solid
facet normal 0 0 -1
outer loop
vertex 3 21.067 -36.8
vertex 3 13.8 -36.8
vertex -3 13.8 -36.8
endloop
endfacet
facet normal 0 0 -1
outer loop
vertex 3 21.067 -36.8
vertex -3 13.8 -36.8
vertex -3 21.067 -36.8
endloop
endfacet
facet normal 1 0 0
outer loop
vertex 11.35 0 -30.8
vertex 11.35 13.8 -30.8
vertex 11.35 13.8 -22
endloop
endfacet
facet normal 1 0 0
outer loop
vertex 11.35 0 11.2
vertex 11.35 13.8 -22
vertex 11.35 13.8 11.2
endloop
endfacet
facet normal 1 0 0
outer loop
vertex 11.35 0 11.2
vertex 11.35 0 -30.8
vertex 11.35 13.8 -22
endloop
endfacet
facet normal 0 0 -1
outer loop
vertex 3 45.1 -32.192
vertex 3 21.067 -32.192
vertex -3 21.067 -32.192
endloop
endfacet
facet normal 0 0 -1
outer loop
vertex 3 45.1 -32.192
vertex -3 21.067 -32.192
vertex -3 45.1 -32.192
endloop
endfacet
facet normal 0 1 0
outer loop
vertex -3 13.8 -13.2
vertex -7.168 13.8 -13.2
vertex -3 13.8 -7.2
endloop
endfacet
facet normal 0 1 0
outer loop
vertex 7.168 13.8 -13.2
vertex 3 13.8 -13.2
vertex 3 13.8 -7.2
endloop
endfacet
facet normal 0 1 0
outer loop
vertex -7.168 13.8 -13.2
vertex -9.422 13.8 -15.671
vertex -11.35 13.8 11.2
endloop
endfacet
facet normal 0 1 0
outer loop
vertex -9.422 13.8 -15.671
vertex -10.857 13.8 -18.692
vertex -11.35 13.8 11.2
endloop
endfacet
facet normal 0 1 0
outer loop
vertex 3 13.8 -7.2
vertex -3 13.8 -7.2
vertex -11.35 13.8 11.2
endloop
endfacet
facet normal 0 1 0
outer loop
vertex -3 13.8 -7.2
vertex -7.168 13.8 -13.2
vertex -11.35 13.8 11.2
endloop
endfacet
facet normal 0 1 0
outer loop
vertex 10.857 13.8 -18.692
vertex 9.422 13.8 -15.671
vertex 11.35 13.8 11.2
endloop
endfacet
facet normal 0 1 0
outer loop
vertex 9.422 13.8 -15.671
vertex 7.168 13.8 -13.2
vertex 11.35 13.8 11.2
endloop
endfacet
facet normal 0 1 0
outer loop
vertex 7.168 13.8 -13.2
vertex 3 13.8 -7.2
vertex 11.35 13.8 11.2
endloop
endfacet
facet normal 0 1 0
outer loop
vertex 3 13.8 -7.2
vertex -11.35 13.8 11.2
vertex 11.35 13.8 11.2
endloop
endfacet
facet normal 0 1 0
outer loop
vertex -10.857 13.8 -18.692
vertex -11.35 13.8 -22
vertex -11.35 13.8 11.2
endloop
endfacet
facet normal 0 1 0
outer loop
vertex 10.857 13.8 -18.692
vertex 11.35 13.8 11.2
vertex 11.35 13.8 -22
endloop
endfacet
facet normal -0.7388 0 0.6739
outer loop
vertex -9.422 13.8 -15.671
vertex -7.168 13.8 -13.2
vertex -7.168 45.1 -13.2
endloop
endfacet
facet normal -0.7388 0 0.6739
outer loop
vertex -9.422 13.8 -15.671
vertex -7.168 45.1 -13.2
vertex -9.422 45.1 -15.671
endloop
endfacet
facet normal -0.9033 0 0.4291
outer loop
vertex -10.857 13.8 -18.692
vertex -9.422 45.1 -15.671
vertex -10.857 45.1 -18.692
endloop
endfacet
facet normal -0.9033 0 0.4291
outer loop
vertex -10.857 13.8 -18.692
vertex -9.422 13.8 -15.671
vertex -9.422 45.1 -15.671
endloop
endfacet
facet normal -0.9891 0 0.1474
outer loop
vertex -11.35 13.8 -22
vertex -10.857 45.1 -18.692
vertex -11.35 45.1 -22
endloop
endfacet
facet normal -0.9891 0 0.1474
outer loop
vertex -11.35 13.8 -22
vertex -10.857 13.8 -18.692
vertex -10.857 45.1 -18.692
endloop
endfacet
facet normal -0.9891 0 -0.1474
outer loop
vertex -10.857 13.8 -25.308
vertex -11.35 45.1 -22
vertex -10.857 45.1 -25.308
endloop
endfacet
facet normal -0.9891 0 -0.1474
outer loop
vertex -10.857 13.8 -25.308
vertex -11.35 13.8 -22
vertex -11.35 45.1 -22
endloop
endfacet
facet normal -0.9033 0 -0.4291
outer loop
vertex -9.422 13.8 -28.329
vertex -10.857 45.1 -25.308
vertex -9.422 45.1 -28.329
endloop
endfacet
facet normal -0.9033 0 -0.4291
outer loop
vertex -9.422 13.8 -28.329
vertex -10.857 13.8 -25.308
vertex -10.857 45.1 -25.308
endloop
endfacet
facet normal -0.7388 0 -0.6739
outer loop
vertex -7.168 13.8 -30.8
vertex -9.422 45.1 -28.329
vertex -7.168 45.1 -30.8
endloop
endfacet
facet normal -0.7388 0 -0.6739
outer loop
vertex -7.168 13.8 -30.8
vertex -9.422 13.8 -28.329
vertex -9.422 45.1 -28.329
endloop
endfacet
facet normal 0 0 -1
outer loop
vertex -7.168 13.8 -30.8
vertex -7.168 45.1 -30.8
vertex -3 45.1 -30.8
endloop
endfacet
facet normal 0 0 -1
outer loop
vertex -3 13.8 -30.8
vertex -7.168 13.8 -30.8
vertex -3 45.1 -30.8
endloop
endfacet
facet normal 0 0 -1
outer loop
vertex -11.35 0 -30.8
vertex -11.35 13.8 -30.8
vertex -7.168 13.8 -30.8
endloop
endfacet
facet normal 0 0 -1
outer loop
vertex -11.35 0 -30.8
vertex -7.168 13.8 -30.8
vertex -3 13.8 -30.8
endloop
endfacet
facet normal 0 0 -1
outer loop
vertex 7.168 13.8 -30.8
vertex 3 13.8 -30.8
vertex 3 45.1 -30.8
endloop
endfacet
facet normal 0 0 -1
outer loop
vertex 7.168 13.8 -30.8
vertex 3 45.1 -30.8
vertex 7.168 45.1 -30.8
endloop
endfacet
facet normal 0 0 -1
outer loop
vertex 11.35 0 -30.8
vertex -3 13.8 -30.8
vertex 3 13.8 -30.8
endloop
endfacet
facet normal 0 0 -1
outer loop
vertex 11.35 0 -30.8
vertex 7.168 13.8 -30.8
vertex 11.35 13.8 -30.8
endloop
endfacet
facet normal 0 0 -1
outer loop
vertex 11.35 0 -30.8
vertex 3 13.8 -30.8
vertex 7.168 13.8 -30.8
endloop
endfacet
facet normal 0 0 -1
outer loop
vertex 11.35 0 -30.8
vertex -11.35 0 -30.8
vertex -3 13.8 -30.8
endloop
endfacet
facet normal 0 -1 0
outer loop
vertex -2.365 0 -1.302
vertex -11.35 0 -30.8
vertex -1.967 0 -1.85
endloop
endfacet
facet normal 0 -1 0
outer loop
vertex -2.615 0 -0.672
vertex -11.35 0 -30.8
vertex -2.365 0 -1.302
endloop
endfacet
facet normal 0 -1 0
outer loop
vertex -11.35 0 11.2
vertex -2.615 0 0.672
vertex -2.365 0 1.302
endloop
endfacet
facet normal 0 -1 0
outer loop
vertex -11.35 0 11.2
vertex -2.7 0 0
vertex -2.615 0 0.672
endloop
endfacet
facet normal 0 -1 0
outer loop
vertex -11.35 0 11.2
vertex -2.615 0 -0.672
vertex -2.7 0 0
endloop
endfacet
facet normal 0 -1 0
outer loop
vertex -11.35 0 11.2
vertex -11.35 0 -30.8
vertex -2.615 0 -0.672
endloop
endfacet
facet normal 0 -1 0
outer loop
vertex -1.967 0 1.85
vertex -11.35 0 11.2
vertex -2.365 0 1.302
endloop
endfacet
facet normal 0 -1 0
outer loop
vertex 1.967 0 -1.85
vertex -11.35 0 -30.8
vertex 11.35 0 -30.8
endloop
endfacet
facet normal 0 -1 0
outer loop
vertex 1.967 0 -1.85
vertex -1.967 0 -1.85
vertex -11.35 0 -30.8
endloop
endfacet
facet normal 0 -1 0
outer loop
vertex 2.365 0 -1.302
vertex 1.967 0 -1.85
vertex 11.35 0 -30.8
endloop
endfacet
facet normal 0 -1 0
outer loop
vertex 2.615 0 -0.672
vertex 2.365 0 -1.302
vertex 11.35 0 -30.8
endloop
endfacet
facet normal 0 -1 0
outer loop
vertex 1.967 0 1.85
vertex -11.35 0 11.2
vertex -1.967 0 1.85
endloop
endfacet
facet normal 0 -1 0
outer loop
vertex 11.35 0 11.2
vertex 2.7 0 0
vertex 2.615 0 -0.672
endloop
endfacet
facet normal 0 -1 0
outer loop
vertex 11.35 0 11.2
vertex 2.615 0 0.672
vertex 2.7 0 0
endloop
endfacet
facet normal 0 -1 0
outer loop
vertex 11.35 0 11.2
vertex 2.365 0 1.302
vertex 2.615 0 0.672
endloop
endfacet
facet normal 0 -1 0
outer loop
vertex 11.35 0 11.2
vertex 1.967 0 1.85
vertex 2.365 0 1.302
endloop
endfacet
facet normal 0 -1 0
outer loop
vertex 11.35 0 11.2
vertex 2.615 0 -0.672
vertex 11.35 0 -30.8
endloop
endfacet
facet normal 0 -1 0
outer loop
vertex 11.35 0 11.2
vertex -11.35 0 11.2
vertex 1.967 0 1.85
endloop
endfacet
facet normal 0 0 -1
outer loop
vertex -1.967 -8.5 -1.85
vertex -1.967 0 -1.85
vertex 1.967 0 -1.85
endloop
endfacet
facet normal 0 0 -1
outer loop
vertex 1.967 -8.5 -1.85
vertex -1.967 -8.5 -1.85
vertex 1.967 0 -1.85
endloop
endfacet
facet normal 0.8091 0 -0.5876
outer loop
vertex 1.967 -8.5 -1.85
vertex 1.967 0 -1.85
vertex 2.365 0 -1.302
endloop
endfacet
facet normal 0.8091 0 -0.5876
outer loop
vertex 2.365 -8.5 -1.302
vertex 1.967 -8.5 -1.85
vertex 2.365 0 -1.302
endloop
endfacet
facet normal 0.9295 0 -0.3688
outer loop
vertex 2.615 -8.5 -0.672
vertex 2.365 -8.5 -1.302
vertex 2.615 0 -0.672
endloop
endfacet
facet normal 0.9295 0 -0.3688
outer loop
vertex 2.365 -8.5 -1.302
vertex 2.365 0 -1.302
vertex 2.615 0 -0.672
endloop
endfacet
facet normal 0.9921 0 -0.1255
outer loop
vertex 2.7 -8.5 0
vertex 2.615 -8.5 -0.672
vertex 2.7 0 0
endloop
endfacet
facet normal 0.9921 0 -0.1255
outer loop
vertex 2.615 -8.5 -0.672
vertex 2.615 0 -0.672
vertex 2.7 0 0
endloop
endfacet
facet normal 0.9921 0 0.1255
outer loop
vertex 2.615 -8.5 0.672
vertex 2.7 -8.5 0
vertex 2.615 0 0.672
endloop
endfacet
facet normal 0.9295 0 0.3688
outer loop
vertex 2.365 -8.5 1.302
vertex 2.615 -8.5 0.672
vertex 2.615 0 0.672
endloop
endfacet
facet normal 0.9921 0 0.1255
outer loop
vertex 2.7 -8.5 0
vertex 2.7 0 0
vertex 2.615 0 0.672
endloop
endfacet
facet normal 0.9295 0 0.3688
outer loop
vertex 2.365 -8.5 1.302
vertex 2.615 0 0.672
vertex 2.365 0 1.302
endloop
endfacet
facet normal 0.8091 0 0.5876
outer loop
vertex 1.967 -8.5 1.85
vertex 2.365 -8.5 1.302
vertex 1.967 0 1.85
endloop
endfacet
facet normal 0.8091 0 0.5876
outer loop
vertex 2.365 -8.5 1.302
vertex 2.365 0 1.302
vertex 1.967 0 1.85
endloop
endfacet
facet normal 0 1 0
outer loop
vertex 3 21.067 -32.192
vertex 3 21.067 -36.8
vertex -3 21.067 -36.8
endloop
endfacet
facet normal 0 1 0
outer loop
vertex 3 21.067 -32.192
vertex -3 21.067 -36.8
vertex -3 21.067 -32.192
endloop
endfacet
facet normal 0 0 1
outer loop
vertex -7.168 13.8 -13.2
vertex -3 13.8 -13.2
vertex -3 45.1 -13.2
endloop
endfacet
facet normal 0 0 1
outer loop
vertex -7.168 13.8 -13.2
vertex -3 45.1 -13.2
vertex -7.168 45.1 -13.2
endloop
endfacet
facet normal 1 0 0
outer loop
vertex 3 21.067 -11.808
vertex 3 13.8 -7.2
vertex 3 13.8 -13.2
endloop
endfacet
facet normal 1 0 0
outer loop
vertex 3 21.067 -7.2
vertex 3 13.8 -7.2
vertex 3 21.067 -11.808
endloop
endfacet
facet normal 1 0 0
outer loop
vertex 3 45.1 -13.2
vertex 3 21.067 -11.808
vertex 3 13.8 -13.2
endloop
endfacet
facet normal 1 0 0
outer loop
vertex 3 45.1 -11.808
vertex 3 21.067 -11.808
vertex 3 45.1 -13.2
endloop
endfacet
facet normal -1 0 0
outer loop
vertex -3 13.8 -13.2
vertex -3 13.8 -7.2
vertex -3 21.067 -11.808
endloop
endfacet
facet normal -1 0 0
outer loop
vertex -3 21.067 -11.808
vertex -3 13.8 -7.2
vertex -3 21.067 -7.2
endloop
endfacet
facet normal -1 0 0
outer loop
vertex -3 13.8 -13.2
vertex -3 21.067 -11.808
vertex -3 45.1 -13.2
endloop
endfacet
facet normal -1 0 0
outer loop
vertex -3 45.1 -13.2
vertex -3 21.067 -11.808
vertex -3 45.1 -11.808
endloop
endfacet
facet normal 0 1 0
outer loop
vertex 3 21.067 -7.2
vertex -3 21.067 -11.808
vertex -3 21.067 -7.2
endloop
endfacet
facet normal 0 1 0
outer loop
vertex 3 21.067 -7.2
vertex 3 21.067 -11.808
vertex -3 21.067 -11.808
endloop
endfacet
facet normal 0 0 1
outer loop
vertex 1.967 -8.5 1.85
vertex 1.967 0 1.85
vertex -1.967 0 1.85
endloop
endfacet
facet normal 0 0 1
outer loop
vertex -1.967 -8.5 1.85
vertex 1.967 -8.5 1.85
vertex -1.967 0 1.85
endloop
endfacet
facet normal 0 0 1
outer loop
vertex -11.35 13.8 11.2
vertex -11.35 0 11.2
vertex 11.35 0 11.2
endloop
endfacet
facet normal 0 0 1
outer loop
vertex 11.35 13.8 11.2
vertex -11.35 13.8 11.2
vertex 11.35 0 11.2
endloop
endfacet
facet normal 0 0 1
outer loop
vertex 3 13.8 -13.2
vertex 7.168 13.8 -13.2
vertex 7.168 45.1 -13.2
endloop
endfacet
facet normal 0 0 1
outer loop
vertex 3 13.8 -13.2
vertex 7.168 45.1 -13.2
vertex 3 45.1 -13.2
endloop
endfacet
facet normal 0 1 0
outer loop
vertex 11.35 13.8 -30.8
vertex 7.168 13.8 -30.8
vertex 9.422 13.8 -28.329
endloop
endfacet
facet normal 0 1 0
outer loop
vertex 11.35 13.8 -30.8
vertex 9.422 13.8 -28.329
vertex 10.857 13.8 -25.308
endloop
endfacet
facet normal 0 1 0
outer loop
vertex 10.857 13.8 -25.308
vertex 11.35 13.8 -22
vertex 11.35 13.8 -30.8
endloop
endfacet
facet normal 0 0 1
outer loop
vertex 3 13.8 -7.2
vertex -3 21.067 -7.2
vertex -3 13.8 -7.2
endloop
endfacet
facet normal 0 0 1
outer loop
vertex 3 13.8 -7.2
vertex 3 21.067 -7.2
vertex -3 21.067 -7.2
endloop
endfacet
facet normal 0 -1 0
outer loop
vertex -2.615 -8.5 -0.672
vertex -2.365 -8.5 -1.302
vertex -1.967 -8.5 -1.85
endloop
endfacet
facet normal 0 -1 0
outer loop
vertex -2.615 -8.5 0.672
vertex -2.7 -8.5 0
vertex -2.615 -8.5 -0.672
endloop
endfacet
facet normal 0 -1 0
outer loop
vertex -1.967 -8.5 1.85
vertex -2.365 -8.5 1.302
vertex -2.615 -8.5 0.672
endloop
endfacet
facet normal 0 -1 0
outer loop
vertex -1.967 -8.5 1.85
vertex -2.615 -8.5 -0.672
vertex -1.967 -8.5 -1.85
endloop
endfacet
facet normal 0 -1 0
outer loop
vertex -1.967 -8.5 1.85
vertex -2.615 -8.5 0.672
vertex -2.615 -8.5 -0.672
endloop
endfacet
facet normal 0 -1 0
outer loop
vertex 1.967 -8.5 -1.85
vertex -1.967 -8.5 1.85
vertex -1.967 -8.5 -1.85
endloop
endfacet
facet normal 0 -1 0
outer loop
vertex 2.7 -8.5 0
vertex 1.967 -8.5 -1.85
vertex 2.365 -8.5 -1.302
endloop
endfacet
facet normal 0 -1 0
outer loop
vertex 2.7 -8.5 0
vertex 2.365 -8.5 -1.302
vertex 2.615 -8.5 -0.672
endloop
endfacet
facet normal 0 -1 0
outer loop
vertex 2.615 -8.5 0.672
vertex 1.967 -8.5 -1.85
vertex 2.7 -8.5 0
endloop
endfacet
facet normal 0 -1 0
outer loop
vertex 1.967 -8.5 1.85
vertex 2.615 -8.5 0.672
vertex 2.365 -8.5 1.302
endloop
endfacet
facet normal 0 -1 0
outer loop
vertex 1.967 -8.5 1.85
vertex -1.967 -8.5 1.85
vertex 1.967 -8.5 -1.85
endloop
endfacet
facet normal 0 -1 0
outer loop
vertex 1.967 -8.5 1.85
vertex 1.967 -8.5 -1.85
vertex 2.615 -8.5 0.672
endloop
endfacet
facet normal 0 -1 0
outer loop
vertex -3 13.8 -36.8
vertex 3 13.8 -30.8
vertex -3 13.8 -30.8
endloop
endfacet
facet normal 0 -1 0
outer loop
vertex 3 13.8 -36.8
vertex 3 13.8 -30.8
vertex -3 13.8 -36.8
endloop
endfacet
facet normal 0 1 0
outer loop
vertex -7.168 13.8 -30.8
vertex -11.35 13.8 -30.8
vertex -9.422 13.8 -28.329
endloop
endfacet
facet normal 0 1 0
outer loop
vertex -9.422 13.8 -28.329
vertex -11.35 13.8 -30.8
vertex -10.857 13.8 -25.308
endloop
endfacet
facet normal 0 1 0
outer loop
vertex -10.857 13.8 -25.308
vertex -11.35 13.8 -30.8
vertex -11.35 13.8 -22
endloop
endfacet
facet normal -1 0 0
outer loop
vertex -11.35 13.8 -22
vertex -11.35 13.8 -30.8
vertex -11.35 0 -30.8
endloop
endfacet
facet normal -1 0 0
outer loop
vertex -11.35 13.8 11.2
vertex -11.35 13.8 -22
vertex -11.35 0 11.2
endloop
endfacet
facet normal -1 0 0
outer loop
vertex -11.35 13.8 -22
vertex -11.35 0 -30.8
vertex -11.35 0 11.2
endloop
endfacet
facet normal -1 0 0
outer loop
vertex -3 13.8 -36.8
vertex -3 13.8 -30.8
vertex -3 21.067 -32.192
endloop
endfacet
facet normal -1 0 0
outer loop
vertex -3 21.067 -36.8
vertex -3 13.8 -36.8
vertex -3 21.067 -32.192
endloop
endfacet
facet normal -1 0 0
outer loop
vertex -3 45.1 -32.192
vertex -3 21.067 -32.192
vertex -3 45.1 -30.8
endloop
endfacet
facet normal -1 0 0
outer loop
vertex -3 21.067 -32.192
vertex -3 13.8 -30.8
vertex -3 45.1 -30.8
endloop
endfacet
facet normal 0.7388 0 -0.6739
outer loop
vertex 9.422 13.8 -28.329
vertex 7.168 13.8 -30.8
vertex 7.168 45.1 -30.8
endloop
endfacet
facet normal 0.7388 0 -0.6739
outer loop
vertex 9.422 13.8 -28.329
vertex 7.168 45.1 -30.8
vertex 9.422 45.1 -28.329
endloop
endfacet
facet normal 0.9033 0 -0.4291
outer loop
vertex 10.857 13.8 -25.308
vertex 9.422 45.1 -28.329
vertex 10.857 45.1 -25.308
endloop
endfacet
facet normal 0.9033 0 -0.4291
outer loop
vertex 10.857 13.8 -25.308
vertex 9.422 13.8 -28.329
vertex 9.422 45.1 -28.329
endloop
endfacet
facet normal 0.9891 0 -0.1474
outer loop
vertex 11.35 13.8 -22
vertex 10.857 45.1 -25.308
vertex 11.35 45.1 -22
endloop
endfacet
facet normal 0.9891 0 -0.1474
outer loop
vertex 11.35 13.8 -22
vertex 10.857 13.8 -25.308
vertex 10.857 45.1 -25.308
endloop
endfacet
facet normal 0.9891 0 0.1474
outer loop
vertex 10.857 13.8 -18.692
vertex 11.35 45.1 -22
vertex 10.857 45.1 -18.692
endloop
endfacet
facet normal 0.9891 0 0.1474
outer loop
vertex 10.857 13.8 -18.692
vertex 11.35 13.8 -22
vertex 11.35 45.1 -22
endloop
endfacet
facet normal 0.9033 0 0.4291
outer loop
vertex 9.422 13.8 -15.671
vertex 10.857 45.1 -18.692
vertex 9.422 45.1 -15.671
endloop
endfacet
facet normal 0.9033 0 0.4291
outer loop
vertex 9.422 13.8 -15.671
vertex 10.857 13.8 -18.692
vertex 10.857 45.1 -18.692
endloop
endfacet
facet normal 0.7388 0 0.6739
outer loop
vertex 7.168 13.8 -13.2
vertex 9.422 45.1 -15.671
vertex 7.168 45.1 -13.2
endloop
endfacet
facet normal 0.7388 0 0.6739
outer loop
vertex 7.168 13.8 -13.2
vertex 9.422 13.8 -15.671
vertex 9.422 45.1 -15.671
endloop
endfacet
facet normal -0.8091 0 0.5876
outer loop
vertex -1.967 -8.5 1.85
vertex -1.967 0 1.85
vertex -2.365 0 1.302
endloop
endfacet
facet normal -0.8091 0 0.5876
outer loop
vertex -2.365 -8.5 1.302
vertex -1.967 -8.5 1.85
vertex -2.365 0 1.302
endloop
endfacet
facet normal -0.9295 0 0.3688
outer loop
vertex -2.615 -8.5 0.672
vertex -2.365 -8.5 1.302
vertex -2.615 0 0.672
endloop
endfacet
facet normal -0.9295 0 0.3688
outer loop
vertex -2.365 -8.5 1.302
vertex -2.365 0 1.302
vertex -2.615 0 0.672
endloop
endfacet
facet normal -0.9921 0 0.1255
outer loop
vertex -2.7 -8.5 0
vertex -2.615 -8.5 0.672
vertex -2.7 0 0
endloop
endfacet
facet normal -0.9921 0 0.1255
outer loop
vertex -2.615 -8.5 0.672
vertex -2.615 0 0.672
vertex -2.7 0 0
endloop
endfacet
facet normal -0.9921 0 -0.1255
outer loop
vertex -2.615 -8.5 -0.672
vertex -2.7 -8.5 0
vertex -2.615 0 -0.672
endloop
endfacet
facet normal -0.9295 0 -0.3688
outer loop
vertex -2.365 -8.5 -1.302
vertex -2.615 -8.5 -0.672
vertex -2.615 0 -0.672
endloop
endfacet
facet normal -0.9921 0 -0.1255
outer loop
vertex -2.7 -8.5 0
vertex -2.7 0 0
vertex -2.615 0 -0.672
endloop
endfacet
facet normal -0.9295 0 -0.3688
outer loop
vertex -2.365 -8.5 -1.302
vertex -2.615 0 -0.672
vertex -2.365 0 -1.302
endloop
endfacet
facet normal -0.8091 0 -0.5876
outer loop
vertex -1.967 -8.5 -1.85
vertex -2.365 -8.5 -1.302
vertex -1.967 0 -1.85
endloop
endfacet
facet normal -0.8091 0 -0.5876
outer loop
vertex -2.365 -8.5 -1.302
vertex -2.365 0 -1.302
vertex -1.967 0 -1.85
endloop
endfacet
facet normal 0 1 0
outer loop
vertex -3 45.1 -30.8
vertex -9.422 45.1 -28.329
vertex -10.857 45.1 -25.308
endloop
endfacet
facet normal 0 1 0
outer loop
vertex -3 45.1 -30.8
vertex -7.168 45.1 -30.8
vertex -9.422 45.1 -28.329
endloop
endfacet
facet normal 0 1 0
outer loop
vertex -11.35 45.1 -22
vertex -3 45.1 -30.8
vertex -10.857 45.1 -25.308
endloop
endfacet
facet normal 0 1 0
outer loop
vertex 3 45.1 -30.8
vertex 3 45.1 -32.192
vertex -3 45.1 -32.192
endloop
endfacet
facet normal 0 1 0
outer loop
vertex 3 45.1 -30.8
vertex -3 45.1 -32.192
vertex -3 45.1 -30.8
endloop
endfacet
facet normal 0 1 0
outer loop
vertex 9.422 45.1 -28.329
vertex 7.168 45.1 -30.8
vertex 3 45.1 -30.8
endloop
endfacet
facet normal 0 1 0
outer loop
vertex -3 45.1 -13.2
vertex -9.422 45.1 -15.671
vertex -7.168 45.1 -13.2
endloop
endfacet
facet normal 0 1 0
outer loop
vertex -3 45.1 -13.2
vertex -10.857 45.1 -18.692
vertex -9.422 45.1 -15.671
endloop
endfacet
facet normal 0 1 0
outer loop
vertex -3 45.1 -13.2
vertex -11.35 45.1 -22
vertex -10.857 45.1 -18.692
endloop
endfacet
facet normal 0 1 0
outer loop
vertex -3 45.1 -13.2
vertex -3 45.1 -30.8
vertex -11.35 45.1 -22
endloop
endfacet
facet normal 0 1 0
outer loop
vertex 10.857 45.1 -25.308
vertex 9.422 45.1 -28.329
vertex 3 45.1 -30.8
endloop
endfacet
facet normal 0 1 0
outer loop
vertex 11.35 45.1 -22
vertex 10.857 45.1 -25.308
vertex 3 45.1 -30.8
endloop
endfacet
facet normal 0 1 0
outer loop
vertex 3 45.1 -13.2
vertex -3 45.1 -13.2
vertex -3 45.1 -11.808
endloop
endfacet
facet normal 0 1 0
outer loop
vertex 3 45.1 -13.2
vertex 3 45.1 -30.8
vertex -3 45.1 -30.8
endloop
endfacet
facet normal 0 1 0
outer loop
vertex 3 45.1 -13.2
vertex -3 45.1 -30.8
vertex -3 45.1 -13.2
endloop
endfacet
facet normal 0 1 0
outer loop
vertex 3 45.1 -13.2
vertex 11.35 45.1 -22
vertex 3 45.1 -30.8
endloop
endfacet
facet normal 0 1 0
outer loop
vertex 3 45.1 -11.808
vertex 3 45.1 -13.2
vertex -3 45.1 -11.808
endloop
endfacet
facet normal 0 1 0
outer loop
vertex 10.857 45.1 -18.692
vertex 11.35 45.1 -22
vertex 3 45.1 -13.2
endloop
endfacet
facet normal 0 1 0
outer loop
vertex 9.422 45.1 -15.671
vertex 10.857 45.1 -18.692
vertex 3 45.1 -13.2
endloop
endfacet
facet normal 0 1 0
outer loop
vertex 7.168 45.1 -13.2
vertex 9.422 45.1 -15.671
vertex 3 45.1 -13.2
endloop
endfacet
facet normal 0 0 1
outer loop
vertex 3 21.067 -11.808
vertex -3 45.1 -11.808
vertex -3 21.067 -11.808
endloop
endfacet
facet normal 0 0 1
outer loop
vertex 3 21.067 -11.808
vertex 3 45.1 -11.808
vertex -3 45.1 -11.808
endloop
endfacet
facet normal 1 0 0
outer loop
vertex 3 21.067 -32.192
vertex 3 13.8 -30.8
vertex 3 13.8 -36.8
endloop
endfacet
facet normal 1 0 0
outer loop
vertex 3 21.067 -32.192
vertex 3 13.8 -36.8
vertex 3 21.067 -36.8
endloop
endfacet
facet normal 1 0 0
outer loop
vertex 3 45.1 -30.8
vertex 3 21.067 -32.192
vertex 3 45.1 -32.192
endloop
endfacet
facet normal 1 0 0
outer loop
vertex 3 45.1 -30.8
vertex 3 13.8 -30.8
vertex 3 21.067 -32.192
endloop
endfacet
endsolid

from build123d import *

# Parameters (mm, degrees)
F0_W     = 22.7
F0_H     = 42
F1_DEPTH = 13.8
F3_DEPTH = 8.5
F5_DEPTH = 45.1
F7_DEPTH = 3


with BuildPart() as f1:
    # F0 (on Front) → F1 (new body)
    with BuildSketch(Plane.XZ):
        with Locations((0, -9.8)):
            Rectangle(F0_W, F0_H)
    extrude(amount=-F1_DEPTH)

    # F2 (on face) → F3 (join)
    with BuildSketch(Plane.XZ):
        with BuildLine():
            Line((1.966596, 1.85), (-1.966596, 1.85))
            ThreePointArc((-1.966596, 1.85), (-2.7, 0), (-1.966596, -1.85))
            Line((-1.966596, -1.85), (1.966596, -1.85))
            ThreePointArc((1.966596, -1.85), (2.7, 0), (1.966596, 1.85))
        make_face()
    extrude(amount=F3_DEPTH)

    # F4 (on face) → F5 (join)
    with BuildSketch(Plane.XZ):
        with BuildLine():
            Line((7.168159, -13.2), (-7.168159, -13.2))
            ThreePointArc((-7.168159, -13.2), (-11.35, -22), (-7.168159, -30.8))
            Line((-7.168159, -30.8), (7.168159, -30.8))
            ThreePointArc((7.168159, -30.8), (11.35, -22), (7.168159, -13.2))
        make_face()
    extrude(amount=-F5_DEPTH)

    # F6 (on Right) → F7 (join, symmetric)
    with BuildSketch(Plane.YZ):
        Polygon((21.067004, -7.2), (13.8, -7.2), (13.8, -36.8), (21.067004, -36.8), (21.067004, -32.191654), (45.1, -32.191654), (45.1, -11.808346), (21.067004, -11.808346), align=None)
    extrude(amount=F7_DEPTH, both=True)


solid = f1.part
